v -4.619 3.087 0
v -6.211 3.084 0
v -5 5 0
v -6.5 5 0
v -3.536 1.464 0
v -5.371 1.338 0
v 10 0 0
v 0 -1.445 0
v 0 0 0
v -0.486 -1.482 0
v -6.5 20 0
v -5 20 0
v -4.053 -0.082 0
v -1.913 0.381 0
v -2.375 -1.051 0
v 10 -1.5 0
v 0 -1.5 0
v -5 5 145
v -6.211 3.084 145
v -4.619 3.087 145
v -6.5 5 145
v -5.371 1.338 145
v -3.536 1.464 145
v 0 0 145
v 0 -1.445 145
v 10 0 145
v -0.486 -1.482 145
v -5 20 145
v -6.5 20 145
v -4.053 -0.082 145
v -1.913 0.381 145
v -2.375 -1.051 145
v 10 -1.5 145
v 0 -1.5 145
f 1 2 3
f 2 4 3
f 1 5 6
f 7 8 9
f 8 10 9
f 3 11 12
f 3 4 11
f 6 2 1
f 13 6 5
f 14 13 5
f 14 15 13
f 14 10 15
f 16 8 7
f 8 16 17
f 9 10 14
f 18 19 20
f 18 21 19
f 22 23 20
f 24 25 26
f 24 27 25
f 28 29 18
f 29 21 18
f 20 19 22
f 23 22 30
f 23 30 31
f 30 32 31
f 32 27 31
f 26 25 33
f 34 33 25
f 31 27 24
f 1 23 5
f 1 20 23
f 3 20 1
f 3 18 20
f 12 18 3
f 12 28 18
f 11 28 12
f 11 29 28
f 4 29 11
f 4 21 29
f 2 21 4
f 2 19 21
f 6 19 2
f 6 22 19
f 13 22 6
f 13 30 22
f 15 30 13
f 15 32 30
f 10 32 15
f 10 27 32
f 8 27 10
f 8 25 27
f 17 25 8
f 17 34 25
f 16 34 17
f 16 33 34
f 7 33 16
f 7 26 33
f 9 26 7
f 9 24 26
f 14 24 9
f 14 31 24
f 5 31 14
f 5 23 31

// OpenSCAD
thickness = 1.5;
inset = 10;
curve_inner_radius = 5;
height = 15;
length = 145;

module side_profile() {
    translate([0, -thickness]) square([inset, thickness]);
    translate([0, curve_inner_radius]) rotate([0, 0, 180]) union() {
        intersection() {
            difference() {
                circle(r = curve_inner_radius + thickness);
                circle(r = curve_inner_radius);
            }
            square([curve_inner_radius + thickness, curve_inner_radius + thickness]);
        }
        translate([curve_inner_radius, -height]) square([thickness, height]);
    }
}

linear_extrude(length) side_profile();
